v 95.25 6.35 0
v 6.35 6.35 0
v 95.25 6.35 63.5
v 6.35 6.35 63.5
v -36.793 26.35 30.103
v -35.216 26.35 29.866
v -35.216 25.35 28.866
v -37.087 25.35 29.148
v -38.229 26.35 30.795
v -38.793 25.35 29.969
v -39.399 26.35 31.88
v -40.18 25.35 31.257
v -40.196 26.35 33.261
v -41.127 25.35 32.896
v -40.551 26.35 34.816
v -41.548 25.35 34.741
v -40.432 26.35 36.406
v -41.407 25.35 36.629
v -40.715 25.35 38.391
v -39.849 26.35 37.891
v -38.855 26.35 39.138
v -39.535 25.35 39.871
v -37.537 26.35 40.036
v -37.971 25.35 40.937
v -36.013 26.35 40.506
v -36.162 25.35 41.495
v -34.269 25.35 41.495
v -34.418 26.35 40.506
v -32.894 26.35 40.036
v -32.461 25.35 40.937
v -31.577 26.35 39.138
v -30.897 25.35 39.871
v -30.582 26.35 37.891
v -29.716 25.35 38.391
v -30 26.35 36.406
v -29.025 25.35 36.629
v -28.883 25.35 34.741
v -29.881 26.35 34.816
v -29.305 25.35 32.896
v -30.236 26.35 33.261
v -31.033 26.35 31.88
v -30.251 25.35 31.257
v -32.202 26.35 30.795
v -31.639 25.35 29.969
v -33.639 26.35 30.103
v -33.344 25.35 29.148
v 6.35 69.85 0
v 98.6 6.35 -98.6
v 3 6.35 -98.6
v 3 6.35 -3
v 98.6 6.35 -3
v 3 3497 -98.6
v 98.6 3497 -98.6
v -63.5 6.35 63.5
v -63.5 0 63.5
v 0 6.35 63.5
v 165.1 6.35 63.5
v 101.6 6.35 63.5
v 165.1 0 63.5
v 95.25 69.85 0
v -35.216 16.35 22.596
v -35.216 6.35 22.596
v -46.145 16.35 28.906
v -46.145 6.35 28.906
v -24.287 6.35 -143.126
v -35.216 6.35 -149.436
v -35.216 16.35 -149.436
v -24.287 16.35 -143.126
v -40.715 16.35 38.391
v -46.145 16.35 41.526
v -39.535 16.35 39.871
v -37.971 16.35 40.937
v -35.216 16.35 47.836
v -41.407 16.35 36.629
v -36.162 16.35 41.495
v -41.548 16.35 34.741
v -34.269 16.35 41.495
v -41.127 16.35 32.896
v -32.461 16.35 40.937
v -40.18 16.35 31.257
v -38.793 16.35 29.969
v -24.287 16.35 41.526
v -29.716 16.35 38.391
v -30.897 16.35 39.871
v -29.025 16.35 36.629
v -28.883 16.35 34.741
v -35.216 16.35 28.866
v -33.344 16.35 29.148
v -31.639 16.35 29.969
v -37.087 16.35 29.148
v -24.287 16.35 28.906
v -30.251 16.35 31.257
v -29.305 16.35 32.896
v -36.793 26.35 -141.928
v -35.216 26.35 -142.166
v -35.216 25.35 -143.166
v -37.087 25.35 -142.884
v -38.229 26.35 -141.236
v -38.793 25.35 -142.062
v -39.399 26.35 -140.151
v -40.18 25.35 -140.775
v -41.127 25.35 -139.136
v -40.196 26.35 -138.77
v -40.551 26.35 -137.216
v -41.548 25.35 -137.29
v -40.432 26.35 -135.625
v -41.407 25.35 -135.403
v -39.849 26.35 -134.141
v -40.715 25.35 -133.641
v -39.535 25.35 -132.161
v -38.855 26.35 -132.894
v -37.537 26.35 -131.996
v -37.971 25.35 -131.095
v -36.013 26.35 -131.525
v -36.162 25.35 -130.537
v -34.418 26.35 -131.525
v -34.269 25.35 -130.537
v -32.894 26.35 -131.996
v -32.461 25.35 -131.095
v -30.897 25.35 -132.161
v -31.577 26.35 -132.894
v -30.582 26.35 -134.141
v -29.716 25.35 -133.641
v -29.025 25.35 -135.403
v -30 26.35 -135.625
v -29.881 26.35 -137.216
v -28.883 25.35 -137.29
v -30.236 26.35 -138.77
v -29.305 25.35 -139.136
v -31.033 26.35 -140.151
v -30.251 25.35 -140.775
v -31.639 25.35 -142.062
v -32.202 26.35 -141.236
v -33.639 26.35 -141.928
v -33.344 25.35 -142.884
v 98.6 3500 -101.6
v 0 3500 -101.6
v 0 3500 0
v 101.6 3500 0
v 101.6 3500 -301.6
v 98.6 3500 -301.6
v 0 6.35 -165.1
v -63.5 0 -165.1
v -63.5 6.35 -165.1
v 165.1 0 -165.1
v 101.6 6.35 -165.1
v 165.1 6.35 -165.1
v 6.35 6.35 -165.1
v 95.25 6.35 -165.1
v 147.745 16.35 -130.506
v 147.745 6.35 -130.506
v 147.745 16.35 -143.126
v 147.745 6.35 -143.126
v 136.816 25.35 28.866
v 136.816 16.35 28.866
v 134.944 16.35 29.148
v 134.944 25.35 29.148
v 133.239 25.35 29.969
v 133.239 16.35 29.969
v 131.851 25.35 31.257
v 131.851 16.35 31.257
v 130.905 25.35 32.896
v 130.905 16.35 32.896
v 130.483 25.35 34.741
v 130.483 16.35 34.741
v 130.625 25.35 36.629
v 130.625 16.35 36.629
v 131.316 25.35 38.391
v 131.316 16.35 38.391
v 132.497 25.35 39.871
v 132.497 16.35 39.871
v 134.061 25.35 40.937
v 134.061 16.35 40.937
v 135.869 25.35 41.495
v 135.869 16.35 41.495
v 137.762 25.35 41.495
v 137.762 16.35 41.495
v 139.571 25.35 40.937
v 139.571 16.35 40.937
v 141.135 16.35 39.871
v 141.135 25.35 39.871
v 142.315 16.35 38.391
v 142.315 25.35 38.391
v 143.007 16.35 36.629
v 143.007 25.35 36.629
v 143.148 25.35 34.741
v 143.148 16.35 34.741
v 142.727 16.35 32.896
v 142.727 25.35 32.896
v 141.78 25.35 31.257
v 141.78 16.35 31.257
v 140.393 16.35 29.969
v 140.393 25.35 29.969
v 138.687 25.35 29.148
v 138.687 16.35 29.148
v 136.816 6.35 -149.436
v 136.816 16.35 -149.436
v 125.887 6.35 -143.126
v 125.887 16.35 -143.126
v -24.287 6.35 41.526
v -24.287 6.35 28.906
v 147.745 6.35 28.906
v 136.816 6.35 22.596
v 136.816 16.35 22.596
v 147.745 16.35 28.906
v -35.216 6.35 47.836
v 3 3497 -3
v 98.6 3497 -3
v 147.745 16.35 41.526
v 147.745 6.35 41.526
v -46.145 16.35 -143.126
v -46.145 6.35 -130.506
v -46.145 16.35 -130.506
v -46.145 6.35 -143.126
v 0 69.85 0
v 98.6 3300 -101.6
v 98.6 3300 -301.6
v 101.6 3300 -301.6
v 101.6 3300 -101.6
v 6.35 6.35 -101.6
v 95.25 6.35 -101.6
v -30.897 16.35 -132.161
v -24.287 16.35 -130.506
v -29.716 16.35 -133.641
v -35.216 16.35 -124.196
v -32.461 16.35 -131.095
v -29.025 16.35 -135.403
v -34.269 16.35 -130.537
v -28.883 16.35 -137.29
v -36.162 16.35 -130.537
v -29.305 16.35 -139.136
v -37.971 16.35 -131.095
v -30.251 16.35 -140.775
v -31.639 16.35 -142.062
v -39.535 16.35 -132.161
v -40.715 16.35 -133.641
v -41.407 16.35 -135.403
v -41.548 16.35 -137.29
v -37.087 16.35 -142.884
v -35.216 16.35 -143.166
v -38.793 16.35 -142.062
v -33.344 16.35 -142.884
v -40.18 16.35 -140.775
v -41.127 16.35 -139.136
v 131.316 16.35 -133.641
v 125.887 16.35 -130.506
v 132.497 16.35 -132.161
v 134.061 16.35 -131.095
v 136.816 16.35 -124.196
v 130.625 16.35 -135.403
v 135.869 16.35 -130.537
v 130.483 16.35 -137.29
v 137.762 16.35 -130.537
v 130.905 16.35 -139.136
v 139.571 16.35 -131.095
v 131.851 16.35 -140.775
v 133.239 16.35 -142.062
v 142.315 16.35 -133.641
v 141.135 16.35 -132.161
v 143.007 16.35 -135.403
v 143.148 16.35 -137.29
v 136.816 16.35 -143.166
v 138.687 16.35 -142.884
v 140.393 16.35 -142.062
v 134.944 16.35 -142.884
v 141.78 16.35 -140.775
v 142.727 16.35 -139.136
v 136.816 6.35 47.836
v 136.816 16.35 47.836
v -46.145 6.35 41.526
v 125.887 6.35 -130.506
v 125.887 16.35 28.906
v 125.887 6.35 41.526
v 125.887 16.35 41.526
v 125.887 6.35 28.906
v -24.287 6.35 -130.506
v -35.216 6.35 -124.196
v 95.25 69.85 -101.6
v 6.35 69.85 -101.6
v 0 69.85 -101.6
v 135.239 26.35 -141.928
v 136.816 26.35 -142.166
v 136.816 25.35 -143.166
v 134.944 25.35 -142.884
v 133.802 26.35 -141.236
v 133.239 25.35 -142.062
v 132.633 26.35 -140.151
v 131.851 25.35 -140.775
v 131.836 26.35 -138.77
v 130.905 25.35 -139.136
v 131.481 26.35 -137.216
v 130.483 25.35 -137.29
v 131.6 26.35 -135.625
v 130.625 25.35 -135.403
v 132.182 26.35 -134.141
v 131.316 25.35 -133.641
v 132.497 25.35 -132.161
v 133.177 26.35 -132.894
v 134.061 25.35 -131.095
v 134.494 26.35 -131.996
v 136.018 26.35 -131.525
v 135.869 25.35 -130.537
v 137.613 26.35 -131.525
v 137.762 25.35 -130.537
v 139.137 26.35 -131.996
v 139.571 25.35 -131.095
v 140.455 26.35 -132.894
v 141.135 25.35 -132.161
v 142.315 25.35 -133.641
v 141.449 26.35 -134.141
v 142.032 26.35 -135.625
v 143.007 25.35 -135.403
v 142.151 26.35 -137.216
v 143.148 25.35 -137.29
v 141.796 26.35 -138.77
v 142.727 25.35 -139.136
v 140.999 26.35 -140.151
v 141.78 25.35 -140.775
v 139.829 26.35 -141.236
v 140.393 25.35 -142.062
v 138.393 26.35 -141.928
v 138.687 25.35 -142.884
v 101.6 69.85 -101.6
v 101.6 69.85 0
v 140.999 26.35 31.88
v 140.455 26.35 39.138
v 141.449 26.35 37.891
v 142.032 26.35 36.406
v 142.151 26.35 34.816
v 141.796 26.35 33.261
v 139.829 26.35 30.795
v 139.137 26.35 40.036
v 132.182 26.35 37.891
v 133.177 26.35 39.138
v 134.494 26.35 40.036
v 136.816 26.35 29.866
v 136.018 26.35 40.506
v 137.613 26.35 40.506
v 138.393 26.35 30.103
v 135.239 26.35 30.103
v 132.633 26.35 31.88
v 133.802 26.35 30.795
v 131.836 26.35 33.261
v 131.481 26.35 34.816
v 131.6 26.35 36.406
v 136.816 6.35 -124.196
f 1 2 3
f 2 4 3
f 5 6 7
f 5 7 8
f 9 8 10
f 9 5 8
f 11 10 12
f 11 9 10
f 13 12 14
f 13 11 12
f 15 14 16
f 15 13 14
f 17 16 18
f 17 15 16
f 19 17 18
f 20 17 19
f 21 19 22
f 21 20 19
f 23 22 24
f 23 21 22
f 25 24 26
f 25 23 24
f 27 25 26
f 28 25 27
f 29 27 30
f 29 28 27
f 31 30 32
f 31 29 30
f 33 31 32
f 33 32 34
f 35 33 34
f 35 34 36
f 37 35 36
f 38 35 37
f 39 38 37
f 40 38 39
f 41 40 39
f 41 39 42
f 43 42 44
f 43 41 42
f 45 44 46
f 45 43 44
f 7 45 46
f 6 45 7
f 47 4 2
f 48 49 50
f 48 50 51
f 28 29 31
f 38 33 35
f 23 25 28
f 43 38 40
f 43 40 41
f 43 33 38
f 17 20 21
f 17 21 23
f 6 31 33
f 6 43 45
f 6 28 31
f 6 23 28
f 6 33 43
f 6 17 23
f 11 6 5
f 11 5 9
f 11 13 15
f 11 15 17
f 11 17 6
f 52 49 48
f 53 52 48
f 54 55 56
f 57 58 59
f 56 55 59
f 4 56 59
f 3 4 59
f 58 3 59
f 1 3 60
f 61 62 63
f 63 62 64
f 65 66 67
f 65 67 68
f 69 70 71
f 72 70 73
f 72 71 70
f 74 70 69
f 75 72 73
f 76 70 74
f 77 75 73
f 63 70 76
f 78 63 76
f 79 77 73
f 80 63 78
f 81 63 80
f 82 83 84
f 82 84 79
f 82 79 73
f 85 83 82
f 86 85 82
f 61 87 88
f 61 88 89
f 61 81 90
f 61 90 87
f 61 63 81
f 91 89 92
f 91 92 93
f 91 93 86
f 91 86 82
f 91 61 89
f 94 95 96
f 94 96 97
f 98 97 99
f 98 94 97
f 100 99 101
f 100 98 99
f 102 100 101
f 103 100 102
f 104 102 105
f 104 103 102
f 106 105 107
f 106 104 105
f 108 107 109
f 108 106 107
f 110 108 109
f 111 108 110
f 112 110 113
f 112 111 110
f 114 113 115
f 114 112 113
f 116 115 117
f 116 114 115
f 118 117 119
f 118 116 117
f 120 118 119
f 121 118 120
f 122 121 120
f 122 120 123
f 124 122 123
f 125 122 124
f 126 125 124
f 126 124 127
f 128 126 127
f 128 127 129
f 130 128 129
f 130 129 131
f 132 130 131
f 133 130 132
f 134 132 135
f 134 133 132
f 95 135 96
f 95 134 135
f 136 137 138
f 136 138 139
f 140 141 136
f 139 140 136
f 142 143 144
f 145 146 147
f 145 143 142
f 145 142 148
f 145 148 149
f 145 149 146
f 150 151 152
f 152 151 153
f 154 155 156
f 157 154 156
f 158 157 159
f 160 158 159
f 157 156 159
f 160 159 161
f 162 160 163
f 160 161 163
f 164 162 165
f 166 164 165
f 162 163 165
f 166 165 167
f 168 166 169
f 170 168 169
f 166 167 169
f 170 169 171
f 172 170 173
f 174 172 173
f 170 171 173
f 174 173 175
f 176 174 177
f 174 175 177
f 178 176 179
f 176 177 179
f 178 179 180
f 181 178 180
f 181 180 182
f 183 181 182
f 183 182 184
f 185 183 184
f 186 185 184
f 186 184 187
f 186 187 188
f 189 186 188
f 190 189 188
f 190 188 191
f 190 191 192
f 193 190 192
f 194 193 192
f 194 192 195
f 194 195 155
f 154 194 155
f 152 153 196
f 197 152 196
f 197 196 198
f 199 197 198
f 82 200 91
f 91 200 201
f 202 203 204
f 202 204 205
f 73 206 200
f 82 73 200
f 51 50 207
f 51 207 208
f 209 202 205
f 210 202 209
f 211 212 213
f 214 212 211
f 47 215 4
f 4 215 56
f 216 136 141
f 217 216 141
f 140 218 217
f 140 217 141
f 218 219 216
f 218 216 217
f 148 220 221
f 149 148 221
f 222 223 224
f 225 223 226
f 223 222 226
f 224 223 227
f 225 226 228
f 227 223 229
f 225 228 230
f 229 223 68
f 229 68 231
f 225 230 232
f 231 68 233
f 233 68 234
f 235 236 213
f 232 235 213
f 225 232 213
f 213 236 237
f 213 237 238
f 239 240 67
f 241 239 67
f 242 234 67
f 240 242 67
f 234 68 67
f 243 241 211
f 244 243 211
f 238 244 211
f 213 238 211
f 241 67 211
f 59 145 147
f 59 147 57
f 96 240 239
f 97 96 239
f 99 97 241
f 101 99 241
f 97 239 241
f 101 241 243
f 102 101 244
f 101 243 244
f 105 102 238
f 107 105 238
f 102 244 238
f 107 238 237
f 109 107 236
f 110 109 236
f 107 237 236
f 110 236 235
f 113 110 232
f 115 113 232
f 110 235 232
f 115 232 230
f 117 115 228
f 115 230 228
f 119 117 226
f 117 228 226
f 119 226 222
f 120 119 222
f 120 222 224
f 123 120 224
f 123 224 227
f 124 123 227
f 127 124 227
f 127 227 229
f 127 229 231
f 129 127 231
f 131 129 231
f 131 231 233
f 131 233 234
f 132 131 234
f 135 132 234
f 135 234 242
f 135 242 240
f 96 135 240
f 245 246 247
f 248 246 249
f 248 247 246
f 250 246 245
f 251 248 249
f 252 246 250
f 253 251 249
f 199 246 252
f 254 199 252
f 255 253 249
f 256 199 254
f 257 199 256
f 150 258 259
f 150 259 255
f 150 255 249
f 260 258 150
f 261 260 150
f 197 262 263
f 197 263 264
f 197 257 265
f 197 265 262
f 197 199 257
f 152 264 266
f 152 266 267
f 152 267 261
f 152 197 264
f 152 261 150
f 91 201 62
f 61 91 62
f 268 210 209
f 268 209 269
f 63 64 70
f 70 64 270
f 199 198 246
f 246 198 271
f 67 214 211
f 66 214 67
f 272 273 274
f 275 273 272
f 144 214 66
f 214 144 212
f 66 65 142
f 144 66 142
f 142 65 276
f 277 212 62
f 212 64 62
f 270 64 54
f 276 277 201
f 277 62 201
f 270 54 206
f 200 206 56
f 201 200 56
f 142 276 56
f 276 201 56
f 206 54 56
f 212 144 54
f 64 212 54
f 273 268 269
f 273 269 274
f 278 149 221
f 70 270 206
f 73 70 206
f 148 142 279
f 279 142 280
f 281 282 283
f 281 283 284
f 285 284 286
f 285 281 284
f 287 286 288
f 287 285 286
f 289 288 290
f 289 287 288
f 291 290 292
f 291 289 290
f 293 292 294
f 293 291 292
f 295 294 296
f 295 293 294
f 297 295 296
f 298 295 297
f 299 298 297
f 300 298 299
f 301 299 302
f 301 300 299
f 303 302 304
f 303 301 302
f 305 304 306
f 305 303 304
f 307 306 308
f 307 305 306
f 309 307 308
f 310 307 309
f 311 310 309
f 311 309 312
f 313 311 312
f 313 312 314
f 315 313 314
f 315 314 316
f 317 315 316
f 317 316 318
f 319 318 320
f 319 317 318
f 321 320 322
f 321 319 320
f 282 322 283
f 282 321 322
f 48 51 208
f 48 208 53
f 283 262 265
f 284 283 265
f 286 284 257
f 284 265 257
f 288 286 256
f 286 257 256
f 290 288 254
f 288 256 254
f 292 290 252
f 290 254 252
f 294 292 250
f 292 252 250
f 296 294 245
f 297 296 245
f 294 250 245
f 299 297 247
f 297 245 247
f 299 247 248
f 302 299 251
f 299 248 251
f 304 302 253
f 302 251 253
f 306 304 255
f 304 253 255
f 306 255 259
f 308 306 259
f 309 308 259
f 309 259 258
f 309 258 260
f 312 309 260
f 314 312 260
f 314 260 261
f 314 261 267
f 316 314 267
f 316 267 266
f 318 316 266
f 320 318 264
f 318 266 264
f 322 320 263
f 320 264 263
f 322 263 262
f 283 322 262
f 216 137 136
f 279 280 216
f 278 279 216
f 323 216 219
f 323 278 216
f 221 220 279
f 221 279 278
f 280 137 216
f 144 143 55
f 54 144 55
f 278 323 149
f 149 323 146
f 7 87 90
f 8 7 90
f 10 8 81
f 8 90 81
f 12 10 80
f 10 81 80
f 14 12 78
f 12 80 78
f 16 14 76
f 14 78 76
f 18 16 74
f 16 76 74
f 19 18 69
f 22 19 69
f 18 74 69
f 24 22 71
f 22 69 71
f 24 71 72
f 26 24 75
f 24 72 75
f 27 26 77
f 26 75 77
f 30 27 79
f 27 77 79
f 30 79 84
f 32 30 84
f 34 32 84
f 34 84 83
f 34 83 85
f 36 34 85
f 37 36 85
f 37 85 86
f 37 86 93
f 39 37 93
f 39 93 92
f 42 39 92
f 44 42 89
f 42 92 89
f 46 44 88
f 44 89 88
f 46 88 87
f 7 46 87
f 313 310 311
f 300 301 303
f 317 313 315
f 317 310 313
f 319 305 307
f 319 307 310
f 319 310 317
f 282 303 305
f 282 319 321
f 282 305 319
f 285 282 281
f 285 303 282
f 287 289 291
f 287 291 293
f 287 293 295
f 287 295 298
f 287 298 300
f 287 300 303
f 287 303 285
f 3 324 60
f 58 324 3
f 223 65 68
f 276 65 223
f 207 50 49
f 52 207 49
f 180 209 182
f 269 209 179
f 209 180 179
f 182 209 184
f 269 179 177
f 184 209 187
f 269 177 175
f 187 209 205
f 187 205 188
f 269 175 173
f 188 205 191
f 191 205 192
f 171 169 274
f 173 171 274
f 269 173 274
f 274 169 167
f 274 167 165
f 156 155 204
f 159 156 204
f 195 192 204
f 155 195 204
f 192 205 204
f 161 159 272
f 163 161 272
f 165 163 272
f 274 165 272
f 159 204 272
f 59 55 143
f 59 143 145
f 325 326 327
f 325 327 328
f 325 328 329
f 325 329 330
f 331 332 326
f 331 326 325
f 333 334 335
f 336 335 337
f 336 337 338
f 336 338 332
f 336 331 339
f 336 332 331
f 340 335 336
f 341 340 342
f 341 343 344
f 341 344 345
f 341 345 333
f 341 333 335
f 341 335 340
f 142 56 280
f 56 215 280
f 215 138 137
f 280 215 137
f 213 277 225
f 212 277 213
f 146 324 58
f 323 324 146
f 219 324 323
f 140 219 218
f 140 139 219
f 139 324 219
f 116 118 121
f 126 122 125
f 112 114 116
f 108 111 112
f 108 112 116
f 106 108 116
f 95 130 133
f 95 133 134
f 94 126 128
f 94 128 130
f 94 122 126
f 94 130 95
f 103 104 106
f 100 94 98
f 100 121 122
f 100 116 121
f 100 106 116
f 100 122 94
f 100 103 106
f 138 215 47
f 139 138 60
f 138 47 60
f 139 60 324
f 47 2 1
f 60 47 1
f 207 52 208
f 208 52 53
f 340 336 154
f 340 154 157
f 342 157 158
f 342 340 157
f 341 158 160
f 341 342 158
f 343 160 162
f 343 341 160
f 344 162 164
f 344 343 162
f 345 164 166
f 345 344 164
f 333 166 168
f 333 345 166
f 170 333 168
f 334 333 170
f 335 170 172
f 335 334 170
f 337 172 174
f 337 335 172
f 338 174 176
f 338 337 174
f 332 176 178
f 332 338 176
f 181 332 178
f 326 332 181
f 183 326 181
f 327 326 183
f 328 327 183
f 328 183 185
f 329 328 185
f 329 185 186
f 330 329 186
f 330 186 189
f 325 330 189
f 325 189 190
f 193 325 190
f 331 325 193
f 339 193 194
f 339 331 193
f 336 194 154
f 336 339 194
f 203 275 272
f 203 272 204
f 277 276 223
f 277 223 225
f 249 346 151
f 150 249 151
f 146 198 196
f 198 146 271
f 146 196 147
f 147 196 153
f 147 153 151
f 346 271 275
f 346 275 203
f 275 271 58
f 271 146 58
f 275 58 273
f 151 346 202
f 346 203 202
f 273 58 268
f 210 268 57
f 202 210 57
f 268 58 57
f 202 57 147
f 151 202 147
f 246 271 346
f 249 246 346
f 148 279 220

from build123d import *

# Parameters (mm, degrees)
CROQUIS1_W               = 101.6
CROQUIS1_H               = 101.6
CROQUIS1_W_2             = 95.6
CROQUIS1_H_2             = 95.6
SALIENTE_EXTRUIR1_DEPTH  = 3500
CROQUIS2_W               = 228.6
CROQUIS2_H               = 228.6
SALIENTE_EXTRUIR2_DEPTH  = 6.35
SALIENTE_EXTRUIR5_DEPTH  = 6.35
SALIENTE_EXTRUIR6_DEPTH  = 6.35
CROQUIS7_R               = 6.35
SALIENTE_EXTRUIR7_DEPTH  = 20
CROQUIS8_R               = 6.35
SALIENTE_EXTRUIR8_DEPTH  = 10
CHAFL_N1_SIZE            = 1
CROQUIS9_W               = 95.6
CROQUIS9_H               = 95.6
SALIENTE_EXTRUIR9_DEPTH  = 3
CROQUIS10_W              = 200
CROQUIS10_H              = 200
SALIENTE_EXTRUIR10_DEPTH = 3


with BuildPart() as part:
    # Croquis1 → Saliente-Extruir1 (new body)
    with BuildSketch(Plane(origin=(0, 0, 0), x_dir=(1, 0, 0), z_dir=(0, 1, 0))):
        with Locations((50.8, 50.8)):
            Rectangle(CROQUIS1_W, CROQUIS1_H)
        with Locations((50.8, 50.8)):
            Rectangle(CROQUIS1_W_2, CROQUIS1_H_2, mode=Mode.SUBTRACT)
    extrude(amount=SALIENTE_EXTRUIR1_DEPTH)

    # Croquis2 → Saliente-Extruir2 (add)
    with BuildSketch(Plane.XZ):
        with Locations((50.8, -50.8)):
            Rectangle(CROQUIS2_W, CROQUIS2_H)
    extrude(amount=-SALIENTE_EXTRUIR2_DEPTH)

    # Croquis5 → Saliente-Extruir5 (add)
    with BuildSketch(Plane.ZY):
        Polygon((-101.6, 6.35), (-165.1, 6.35), (-101.6, 69.85), align=None)
        Polygon((63.5, 6.35), (0, 6.35), (0, 69.85), align=None)
    extrude(amount=-SALIENTE_EXTRUIR5_DEPTH)

    # Croquis6 → Saliente-Extruir6 (add)
    with BuildSketch(Plane(origin=(101.6, 0, 0), x_dir=(0, 0, -1), z_dir=(1, 0, 0))):
        Polygon((0, 69.85), (-63.5, 6.35), (0, 6.35), align=None)
        Polygon((101.6, 69.85), (165.1, 6.35), (101.6, 6.35), align=None)
    extrude(amount=-SALIENTE_EXTRUIR6_DEPTH)

    # Croquis7 → Saliente-Extruir7 (add)
    with BuildSketch(Plane(origin=(0, 6.35, 0), x_dir=(1, 0, 0), z_dir=(0, 1, 0))):
        with Locations(Location((136.815728753, 136.815728753, 0), (0, 0, 90))):
            Circle(CROQUIS7_R)
        with Locations(Location((136.815728753, -35.215728753, 0), (0, 0, 90))):
            Circle(CROQUIS7_R)
        with Locations(Location((-35.215728753, -35.215728753, 0), (0, 0, 90))):
            Circle(CROQUIS7_R)
        with Locations(Location((-35.215728753, 136.815728753, 0), (0, 0, 90))):
            Circle(CROQUIS7_R)
    extrude(amount=SALIENTE_EXTRUIR7_DEPTH)

    # Croquis8 → Saliente-Extruir8 (add)
    # profile 1 of 4: a face of its own
    with BuildSketch(Plane(origin=(0, 6.35, 0), x_dir=(1, 0, 0), z_dir=(0, 1, 0))):
        Polygon((136.815728753, 124.195901838), (147.744819452, 130.505815295), (147.744819452, 143.12564221), (136.815728753, 149.435555667), (125.886638053, 143.12564221), (125.886638053, 130.505815295), align=None)
        with Locations(Location((136.815728753, 136.815728753, 0), (0, 0, 270))):
            Circle(CROQUIS8_R, mode=Mode.SUBTRACT)
    # profile 2 of 4: a face of its own
    with BuildSketch(Plane(origin=(0, 6.35, 0), x_dir=(1, 0, 0), z_dir=(0, 1, 0))):
        Polygon((125.886638053, -28.905815295), (136.815728753, -22.595901838), (147.744819452, -28.905815295), (147.744819452, -41.52564221), (136.815728753, -47.835555667), (125.886638053, -41.52564221), align=None)
        with Locations(Location((136.815728753, -35.215728753, 0), (0, 0, 90))):
            Circle(CROQUIS8_R, mode=Mode.SUBTRACT)
    # profile 3 of 4: a face of its own
    with BuildSketch(Plane(origin=(0, 6.35, 0), x_dir=(1, 0, 0), z_dir=(0, 1, 0))):
        Polygon((-35.215728753, -22.595901838), (-46.144819452, -28.905815295), (-46.144819452, -41.52564221), (-35.215728753, -47.835555667), (-24.286638053, -41.52564221), (-24.286638053, -28.905815295), align=None)
        with Locations(Location((-35.215728753, -35.215728753, 0), (0, 0, 270))):
            Circle(CROQUIS8_R, mode=Mode.SUBTRACT)
    # profile 4 of 4: a face of its own
    with BuildSketch(Plane(origin=(0, 6.35, 0), x_dir=(1, 0, 0), z_dir=(0, 1, 0))):
        Polygon((-24.286638053, 130.505815295), (-35.215728753, 124.195901838), (-46.144819452, 130.505815295), (-46.144819452, 143.12564221), (-35.215728753, 149.435555667), (-24.286638053, 143.12564221), align=None)
        with Locations(Location((-35.215728753, 136.815728753, 0), (0, 0, 90))):
            Circle(CROQUIS8_R, mode=Mode.SUBTRACT)
    extrude(amount=SALIENTE_EXTRUIR8_DEPTH)

    # Chaflán1
    chafl_n1_edges = [part.edges().sort_by_distance(p)[0] for p in [
        (136.815728753, 26.35, -130.465728753),
        (136.815728753, 26.35, 41.565728753),
        (-35.215728753, 26.35, 41.565728753),
        (-35.215728753, 26.35, -130.465728753),
    ]]
    chamfer(chafl_n1_edges, length=CHAFL_N1_SIZE)

    # Croquis9 → Saliente-Extruir9 (add)
    with BuildSketch(Plane(origin=(0, 3500, 0), x_dir=(1, 0, 0), z_dir=(0, 1, 0))):
        with Locations((50.8, 50.8)):
            Rectangle(CROQUIS9_W, CROQUIS9_H)
    extrude(amount=-SALIENTE_EXTRUIR9_DEPTH)

    # Croquis10 → Saliente-Extruir10 (add)
    with BuildSketch(Plane(origin=(101.6, 0, 0), x_dir=(0, 0, -1), z_dir=(1, 0, 0))):
        with Locations((201.6, 3400)):
            Rectangle(CROQUIS10_W, CROQUIS10_H)
    extrude(amount=-SALIENTE_EXTRUIR10_DEPTH)


solid = part.part
